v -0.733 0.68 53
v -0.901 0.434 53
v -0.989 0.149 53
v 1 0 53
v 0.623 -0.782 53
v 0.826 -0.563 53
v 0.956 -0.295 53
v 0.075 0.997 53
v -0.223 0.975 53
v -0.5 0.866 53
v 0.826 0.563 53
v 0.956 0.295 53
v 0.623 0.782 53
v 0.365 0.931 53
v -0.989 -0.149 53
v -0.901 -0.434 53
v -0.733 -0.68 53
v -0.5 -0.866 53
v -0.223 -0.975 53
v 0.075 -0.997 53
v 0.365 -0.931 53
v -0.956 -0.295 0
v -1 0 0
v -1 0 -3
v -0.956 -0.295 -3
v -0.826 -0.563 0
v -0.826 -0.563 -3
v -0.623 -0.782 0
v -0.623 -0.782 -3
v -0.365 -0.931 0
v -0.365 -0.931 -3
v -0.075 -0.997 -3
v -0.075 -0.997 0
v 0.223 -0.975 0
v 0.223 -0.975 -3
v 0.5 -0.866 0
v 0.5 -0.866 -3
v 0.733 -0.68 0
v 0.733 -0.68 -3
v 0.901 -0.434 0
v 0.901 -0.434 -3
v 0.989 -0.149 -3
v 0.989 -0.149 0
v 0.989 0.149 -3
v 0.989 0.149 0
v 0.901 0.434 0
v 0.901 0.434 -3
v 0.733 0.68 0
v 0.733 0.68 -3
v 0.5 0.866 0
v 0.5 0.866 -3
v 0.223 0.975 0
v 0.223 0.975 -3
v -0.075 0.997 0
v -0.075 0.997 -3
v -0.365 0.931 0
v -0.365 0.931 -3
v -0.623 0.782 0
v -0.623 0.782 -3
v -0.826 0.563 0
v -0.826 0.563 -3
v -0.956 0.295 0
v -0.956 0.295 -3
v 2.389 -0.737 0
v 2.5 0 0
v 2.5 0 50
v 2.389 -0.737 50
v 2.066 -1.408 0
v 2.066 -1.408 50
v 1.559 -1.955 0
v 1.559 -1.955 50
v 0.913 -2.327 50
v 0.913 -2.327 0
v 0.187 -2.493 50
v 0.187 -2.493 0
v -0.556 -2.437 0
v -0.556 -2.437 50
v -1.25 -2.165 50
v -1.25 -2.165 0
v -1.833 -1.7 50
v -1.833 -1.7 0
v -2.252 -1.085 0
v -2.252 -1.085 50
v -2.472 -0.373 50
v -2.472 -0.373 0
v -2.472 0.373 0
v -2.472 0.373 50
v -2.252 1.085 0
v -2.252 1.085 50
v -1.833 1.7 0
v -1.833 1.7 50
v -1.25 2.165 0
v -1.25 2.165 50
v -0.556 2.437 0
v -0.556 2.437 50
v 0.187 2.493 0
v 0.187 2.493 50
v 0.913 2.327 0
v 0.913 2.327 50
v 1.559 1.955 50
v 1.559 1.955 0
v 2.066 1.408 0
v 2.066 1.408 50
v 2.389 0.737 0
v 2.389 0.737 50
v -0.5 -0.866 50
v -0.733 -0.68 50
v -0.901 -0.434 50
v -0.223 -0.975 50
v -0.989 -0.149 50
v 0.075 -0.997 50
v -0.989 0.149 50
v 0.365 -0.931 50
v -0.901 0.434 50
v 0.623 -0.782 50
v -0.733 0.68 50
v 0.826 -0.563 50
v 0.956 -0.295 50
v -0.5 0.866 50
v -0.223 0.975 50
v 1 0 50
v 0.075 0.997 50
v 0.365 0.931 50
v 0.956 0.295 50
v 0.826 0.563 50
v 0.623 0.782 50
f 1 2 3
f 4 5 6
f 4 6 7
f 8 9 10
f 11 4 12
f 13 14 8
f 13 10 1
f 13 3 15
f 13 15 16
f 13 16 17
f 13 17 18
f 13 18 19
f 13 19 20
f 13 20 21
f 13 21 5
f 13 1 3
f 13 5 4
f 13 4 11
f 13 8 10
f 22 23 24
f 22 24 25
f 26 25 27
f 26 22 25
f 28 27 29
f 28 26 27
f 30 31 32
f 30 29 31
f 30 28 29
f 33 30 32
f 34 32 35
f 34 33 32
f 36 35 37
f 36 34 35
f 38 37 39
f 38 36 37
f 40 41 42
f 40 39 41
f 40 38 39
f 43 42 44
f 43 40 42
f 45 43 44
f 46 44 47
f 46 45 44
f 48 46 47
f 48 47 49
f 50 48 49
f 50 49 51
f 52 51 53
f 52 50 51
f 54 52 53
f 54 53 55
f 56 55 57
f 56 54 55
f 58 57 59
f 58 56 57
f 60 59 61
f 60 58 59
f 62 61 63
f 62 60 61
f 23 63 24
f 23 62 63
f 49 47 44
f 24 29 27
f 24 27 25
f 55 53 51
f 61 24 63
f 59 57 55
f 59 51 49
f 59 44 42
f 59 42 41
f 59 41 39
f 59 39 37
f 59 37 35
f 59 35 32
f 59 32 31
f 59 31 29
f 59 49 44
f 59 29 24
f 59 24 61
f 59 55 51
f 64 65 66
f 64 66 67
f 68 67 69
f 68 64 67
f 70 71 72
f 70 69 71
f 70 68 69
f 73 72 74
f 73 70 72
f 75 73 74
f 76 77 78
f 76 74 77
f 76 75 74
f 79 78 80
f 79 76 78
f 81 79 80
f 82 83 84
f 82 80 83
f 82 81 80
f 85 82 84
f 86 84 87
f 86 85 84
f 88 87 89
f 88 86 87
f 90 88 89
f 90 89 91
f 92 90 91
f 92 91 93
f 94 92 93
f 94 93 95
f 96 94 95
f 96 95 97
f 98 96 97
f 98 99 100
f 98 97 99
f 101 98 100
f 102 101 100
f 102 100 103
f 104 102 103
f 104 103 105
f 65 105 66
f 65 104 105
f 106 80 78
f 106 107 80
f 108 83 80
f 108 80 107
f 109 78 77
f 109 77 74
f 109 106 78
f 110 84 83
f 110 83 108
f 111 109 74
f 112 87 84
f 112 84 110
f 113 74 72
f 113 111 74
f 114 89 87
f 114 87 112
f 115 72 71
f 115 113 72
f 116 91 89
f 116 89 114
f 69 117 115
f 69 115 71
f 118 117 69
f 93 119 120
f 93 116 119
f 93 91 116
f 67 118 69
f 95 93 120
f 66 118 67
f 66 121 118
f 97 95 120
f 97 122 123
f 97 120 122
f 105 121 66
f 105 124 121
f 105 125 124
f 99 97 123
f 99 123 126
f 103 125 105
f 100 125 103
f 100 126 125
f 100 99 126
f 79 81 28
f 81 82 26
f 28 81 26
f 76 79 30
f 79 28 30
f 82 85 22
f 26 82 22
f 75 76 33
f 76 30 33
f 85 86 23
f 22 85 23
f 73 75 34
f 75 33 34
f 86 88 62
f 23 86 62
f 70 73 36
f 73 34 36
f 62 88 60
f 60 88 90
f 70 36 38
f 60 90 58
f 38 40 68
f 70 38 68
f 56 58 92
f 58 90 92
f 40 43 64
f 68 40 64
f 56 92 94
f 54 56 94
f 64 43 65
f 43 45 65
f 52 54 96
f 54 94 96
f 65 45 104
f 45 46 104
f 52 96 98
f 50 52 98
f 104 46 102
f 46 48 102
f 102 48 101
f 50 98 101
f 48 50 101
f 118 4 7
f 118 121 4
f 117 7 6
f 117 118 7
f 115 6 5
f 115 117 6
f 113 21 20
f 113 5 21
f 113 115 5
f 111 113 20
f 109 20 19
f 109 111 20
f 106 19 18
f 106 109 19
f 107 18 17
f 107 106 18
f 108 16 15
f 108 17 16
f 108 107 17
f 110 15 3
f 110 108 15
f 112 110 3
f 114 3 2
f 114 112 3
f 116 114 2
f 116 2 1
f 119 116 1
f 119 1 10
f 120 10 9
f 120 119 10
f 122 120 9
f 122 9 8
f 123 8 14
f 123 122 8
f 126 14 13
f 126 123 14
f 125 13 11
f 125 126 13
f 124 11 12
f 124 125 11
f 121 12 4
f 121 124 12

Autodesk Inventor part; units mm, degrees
ref_plane "YZ Plane" through (0, 0, 0) normal (1, 0, 0) x (0, 1, 0)
ref_plane "XZ Plane" through (0, 0, 0) normal (0, 1, 0) x (-1, 0, 0)
ref_plane "XY Plane" through (0, 0, 0) normal (0, 0, 1) x (1, 0, 0)
sketch "Sketch1" plane through (0, 0, 0) normal (0, 0, 1) x (1, 0, 0)
  circle A0 centre (0, 0) radius 2.5
  dimension "d0" = 5
extrude "Extrusion1" add sketch "Sketch1" along normal blind 50
sketch "Sketch2" plane through (0, 0, 50) normal (0, 0, 1) x (1, 0, 0)
  circle A0 centre (0, 0) radius 2.5 projected
  circle A1 centre (0, 0) radius 1
  dimension "d3" = 2
extrude "Extrusion2" add sketch "Sketch2" along normal blind 3 contours A1
sketch "Sketch3" plane through (0, 0, 0) normal (0, 0, -1) x (-1, 0, 0)
  circle A0 centre (0, 0) radius 1
  dimension "d6" = 2
extrude "Extrusion3" add sketch "Sketch3" along normal blind 3
properties part number "Bone-5cm"
